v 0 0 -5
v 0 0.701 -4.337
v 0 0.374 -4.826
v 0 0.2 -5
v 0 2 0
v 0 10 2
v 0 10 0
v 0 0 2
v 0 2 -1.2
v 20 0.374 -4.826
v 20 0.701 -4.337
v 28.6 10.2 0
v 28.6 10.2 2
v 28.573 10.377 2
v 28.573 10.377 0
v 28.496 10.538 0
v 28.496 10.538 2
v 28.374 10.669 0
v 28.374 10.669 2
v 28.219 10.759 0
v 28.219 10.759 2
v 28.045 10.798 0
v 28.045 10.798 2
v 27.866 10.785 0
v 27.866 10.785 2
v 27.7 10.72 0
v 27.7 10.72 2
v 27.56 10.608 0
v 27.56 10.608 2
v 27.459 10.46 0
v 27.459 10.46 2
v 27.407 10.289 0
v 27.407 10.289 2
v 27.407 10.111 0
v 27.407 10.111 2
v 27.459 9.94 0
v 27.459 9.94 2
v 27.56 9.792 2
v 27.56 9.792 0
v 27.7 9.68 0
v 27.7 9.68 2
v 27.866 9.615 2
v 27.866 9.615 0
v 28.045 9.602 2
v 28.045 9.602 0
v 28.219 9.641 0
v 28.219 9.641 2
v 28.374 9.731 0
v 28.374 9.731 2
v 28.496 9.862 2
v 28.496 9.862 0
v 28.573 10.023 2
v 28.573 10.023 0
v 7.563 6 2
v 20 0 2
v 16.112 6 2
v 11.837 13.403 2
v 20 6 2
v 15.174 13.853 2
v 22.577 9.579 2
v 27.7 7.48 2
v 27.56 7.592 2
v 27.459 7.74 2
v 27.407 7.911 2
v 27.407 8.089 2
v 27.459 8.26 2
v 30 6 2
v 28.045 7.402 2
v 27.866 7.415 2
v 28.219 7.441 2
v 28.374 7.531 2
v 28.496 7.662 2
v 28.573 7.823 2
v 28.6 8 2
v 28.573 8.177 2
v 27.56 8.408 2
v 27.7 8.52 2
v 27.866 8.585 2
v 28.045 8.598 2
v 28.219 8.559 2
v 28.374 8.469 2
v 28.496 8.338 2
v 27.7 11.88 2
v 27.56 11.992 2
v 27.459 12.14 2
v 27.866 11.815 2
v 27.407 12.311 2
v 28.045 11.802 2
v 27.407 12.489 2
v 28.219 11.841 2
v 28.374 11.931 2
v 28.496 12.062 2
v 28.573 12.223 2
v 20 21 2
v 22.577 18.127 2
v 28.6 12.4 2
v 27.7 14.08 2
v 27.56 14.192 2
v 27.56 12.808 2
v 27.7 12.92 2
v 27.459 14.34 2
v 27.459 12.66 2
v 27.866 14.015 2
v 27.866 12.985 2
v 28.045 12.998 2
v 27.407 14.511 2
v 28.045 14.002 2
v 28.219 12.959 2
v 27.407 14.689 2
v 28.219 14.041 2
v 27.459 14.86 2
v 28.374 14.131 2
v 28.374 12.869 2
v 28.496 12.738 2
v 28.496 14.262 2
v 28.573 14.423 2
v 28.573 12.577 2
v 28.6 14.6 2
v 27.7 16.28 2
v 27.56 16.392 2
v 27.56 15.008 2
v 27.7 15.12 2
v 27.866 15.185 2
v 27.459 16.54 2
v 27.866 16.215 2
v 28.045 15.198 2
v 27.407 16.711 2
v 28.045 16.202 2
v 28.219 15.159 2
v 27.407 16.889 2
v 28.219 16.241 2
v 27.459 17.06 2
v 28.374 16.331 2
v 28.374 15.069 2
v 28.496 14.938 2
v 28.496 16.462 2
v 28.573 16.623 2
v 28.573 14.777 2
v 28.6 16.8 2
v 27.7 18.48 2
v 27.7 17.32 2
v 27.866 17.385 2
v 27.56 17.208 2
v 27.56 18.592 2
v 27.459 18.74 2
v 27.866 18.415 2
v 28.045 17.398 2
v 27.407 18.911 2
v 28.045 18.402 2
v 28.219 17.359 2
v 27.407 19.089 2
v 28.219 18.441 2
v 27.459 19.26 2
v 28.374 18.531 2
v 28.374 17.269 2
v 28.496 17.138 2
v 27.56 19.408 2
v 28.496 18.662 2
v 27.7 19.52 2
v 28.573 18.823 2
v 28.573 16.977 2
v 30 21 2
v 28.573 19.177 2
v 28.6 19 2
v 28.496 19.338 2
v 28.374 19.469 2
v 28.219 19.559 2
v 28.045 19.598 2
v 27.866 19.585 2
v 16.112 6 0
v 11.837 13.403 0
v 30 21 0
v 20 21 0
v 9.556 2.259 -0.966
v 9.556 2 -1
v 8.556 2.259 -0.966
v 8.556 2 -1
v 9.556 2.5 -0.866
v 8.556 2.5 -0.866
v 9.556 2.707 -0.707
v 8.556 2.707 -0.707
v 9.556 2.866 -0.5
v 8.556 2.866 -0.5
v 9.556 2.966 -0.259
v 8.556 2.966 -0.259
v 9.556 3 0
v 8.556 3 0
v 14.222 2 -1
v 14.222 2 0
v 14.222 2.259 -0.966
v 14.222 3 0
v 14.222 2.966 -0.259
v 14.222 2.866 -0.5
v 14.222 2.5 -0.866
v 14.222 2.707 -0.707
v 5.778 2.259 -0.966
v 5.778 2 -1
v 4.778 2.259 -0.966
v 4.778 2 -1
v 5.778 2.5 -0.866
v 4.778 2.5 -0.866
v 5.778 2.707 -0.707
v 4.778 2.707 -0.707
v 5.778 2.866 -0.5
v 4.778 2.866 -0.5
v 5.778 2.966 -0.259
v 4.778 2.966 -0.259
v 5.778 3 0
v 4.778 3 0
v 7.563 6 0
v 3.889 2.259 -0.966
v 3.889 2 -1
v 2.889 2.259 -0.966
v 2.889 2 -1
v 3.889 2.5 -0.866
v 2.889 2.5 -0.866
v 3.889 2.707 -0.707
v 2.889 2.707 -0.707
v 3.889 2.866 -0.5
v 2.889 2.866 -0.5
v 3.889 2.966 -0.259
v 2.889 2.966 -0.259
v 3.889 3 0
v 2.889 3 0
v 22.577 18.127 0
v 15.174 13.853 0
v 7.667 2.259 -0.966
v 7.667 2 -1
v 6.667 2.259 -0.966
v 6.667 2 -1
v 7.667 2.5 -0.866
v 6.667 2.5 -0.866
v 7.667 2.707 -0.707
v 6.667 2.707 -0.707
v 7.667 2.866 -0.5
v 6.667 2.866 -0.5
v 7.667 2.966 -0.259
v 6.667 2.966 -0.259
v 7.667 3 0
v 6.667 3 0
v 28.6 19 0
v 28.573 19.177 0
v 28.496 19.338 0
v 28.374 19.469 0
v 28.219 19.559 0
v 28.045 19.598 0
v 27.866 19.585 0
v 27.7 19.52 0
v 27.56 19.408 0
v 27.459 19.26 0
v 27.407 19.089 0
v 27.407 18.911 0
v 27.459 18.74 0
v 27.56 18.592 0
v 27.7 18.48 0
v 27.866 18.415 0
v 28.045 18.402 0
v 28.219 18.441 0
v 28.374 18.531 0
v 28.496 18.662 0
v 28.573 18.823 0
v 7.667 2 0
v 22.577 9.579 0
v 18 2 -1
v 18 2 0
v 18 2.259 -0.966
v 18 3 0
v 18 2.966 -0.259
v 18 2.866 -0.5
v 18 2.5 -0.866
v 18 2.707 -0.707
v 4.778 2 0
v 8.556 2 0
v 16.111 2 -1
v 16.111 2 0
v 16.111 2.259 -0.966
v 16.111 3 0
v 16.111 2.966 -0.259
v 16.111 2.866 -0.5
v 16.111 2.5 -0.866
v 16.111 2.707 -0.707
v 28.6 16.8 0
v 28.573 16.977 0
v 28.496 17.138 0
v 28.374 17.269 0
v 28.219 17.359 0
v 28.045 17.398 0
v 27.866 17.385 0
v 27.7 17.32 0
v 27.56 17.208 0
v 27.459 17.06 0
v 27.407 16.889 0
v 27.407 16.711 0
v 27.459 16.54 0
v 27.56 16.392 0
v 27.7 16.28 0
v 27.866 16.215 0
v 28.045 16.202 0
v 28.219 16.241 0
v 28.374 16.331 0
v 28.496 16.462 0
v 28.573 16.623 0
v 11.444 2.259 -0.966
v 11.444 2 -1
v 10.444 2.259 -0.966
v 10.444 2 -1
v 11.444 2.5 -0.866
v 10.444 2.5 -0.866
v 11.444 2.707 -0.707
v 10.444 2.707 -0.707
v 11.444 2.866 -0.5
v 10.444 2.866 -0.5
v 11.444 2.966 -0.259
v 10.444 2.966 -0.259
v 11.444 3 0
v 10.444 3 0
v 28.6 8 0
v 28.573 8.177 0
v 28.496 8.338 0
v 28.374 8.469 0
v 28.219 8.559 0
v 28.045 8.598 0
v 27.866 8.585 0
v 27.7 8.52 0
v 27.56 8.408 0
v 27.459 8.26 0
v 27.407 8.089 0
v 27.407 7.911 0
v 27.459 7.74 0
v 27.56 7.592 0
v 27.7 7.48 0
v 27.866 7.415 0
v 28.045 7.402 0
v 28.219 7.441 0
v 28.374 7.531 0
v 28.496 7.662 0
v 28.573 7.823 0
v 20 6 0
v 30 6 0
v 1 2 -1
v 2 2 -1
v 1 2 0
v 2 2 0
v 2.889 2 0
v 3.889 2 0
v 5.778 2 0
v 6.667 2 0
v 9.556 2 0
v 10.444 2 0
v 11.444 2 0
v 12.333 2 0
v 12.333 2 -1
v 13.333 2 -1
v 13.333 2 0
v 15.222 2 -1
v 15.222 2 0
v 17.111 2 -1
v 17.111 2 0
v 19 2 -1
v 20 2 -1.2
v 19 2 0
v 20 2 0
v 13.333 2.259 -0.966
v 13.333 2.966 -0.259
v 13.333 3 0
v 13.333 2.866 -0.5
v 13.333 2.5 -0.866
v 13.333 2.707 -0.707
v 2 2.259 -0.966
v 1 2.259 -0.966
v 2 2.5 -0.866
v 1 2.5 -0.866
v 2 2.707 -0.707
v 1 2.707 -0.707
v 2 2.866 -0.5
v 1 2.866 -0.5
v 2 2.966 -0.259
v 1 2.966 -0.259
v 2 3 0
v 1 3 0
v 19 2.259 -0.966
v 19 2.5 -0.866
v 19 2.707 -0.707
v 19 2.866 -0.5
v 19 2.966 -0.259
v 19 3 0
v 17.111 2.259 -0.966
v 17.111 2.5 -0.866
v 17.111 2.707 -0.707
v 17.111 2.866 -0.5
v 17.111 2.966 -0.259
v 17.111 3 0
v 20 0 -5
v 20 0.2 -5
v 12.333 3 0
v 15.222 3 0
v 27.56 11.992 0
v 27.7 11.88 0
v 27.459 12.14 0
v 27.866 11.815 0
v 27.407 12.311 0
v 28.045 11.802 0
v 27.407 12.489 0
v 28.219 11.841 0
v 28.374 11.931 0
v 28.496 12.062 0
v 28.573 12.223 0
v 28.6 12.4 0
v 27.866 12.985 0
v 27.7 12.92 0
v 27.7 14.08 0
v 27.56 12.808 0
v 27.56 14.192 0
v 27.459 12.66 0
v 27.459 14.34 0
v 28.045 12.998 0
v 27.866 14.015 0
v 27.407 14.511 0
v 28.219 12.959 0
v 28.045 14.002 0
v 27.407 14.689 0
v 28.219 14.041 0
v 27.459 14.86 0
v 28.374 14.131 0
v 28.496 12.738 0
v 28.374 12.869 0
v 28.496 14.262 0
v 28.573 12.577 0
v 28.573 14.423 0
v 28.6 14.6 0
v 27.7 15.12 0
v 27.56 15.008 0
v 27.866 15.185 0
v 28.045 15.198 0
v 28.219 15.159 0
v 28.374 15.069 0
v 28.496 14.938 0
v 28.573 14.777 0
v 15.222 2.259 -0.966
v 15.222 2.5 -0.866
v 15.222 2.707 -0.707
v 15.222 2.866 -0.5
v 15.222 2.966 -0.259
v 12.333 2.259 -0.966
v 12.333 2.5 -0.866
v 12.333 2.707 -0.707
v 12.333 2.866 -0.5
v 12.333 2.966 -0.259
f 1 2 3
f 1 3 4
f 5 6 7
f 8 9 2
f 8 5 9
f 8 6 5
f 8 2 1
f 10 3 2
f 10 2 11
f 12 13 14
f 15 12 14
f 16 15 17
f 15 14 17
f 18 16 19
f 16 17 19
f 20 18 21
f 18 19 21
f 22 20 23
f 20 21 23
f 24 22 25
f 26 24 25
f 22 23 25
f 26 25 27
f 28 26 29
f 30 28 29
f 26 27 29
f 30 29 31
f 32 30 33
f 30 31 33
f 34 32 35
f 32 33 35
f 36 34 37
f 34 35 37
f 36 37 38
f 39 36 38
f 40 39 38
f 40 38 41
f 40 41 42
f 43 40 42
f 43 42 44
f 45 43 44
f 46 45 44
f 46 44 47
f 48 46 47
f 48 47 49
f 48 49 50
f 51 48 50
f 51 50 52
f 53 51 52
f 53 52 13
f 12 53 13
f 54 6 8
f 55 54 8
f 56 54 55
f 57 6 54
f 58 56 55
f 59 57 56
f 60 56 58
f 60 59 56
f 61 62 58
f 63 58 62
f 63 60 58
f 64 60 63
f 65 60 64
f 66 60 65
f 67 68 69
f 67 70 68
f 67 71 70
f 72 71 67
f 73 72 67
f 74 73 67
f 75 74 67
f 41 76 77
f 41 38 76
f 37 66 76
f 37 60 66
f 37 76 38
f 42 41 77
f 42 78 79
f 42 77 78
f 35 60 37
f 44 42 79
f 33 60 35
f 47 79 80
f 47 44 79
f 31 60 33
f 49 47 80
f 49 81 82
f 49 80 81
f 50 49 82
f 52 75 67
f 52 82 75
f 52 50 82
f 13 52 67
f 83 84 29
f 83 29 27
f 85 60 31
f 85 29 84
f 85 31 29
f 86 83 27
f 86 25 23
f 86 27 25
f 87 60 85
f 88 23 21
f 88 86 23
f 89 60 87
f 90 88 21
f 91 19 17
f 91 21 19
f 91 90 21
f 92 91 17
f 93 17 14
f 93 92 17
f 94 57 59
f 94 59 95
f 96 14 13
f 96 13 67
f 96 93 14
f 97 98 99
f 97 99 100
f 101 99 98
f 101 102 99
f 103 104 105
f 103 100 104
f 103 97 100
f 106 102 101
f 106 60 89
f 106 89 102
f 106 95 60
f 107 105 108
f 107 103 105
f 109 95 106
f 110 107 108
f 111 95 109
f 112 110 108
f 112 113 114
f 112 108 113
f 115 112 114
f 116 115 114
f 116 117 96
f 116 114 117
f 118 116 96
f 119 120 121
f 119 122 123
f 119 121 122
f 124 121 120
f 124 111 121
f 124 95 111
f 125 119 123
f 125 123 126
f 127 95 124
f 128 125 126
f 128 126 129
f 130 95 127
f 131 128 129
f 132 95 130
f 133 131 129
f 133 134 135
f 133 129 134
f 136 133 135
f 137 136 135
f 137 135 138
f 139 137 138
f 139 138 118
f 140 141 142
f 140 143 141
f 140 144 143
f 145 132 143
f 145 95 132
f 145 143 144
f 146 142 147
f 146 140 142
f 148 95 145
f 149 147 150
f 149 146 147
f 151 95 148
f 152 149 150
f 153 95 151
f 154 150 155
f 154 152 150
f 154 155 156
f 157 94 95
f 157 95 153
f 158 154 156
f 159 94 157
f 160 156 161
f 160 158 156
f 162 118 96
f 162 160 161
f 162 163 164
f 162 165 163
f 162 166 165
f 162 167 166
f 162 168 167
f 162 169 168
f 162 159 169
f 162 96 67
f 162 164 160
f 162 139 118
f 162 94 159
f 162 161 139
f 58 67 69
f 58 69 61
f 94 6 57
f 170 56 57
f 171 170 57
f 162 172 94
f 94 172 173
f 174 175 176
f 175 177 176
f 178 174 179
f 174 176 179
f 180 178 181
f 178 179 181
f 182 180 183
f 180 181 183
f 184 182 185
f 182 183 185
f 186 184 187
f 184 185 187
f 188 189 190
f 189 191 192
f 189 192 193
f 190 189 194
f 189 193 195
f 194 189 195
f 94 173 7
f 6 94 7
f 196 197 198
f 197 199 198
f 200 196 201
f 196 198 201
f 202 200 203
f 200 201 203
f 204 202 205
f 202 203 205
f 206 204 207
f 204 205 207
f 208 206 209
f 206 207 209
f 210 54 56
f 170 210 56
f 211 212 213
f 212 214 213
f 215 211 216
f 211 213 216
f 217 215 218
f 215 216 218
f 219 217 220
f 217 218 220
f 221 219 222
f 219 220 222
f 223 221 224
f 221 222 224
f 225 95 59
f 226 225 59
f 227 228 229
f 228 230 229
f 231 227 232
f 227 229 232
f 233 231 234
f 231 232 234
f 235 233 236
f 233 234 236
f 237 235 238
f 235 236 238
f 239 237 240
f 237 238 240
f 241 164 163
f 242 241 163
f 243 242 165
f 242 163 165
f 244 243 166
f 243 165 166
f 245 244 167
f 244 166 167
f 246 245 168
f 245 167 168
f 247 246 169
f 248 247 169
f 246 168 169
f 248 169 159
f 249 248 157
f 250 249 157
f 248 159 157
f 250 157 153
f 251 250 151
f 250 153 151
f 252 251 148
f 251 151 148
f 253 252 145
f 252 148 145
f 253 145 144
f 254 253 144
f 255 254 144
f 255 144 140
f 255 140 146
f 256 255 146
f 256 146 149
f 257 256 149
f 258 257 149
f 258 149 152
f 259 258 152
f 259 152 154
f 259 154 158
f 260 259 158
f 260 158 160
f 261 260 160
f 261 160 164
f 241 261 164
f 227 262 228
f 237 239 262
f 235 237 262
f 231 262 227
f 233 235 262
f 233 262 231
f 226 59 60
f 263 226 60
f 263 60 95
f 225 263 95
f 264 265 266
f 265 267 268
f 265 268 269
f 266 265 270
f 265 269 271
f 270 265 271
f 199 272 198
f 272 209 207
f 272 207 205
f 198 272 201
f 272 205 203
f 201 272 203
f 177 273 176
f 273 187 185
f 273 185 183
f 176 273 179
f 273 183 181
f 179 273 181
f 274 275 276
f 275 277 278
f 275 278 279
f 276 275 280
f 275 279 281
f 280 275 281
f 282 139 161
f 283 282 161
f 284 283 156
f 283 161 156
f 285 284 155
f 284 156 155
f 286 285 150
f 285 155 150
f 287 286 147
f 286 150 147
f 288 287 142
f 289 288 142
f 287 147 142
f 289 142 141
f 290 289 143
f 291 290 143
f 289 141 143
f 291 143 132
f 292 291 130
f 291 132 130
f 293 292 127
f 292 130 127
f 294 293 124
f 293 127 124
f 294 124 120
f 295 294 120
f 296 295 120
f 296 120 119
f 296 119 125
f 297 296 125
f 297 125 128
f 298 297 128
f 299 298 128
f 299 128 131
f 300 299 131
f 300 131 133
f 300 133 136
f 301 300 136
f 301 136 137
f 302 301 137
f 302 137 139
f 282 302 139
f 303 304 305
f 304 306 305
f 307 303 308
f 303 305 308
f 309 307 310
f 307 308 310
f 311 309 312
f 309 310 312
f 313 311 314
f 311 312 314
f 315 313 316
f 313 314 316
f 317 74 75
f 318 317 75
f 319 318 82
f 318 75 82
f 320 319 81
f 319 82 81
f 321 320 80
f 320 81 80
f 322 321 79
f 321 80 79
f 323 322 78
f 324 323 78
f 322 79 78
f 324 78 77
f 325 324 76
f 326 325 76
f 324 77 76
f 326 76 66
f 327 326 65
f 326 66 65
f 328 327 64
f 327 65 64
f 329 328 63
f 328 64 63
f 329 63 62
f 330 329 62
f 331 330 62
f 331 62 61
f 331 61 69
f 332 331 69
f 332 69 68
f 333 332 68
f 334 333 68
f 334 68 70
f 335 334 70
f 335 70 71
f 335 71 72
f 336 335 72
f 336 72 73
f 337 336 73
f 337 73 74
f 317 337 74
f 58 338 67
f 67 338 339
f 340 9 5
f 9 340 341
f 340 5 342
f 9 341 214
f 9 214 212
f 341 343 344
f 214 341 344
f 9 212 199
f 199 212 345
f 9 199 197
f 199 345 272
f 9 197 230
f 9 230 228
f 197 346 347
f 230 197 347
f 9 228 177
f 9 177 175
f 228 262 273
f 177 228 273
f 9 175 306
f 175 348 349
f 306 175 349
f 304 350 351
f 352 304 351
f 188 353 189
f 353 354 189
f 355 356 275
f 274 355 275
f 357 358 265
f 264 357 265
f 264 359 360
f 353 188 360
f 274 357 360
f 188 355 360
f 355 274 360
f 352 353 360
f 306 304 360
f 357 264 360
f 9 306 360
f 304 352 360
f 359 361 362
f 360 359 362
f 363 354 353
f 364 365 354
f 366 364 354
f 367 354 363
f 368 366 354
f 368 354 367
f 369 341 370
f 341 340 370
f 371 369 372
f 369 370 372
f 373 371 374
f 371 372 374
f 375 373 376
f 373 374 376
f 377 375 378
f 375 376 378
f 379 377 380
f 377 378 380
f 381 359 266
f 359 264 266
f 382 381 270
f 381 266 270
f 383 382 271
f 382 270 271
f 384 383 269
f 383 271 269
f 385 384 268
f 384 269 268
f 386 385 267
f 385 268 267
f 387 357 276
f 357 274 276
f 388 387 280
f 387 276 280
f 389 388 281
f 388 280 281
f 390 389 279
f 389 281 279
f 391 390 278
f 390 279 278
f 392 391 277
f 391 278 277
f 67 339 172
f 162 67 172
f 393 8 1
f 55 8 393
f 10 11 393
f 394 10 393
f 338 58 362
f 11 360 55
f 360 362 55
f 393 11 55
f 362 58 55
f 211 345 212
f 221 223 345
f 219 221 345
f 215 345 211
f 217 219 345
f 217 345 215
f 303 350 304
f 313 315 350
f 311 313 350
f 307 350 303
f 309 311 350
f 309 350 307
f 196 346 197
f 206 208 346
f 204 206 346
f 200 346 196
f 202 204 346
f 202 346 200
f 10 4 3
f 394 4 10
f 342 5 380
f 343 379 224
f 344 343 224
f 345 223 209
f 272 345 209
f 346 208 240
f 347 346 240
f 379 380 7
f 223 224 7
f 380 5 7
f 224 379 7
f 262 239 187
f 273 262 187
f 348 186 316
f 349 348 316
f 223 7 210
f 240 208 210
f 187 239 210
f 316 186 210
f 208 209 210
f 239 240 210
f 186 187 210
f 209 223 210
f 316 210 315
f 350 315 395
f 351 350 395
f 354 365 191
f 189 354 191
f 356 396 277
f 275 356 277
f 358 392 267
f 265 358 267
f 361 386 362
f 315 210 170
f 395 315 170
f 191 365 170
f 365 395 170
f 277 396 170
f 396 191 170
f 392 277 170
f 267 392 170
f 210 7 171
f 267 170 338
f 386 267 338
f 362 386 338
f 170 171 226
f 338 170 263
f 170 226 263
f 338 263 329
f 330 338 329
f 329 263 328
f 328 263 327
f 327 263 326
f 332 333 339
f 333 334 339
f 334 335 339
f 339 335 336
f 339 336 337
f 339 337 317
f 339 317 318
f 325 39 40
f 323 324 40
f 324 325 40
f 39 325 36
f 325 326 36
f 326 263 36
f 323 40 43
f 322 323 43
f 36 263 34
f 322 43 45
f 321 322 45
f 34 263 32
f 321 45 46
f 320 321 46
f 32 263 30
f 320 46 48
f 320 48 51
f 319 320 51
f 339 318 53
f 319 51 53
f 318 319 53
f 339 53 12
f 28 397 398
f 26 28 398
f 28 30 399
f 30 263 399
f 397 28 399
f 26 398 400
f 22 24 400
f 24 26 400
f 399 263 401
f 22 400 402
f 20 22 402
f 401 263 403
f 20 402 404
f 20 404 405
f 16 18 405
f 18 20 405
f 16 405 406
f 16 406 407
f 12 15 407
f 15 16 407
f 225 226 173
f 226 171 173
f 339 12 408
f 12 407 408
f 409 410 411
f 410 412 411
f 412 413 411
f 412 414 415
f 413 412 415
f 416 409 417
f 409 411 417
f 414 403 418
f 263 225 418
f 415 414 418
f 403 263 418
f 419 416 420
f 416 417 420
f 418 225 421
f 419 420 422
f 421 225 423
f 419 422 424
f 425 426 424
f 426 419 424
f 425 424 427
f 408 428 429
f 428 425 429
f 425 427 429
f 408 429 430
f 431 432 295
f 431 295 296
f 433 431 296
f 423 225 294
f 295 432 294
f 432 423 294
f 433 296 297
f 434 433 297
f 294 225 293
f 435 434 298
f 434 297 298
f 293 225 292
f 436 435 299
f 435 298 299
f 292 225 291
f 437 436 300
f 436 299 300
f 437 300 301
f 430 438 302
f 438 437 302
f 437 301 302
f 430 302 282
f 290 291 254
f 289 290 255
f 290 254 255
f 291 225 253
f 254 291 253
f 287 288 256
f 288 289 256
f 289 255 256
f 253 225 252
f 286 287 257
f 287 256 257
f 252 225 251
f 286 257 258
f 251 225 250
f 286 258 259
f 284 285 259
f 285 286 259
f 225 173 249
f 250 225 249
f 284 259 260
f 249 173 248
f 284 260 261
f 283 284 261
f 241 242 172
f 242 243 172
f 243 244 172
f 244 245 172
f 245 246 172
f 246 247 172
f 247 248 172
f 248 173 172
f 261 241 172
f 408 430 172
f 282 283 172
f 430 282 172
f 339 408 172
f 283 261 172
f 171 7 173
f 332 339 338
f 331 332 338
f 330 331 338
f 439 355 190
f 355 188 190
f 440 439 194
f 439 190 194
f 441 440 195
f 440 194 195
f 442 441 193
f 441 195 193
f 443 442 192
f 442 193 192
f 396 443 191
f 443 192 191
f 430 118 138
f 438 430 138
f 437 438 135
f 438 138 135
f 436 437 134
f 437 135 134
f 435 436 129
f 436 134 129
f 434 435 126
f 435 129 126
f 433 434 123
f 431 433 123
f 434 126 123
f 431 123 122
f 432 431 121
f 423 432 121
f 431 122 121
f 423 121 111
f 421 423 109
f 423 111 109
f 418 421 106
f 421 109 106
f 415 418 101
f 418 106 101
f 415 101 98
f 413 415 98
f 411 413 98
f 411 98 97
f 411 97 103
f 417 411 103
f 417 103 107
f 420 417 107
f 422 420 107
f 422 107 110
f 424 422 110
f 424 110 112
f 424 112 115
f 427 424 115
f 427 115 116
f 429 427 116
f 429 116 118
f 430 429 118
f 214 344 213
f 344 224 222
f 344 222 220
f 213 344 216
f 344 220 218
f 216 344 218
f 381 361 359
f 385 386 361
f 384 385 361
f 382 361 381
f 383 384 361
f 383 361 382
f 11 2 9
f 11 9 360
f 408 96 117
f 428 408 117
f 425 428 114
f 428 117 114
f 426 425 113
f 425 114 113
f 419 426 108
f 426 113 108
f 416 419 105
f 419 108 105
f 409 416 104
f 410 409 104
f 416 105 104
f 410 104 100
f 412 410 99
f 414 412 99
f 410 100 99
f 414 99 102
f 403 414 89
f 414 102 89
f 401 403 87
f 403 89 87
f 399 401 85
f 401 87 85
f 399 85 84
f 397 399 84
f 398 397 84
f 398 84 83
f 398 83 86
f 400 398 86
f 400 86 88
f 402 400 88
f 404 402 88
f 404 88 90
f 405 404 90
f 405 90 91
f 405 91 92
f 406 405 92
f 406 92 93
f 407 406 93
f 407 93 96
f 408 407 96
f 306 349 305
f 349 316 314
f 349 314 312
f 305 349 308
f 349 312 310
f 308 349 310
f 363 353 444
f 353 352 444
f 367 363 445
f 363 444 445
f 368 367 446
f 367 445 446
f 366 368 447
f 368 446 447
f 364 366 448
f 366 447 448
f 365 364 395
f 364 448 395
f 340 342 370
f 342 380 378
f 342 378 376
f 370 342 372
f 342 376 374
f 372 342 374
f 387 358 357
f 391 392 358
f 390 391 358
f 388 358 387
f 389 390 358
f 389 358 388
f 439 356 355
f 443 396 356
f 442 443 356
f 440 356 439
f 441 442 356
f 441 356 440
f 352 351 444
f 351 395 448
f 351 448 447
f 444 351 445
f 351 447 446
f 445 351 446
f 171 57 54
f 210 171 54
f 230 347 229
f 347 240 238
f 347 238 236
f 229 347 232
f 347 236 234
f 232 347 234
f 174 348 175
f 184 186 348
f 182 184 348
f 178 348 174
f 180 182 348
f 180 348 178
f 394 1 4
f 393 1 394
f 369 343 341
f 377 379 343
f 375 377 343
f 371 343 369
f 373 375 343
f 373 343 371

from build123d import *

# Parameters (mm, degrees)
PAD_DEPTH              = 2
SKETCH001_R            = 0.6
HOLE_DEPTH             = 2.001
LINEARPATTERN_COUNT    = 6
LINEARPATTERN_PITCH    = 2.2
POCKET_DEPTH           = 2.001
SKETCH003_W            = 20
SKETCH003_H            = 2
PAD001_DEPTH           = 5
SKETCH004_W            = 1
SKETCH004_H            = 1
REVOLUTION_ANGLE       = -90
LINEARPATTERN001_COUNT = 10
LINEARPATTERN001_PITCH = 1.888889
CHAMFER_SIZE           = 1.8
CHAMFER001_SIZE        = 2
CHAMFER002_SIZE        = 0.3


with BuildPart() as part:
    # Sketch → Pad (new body)
    with BuildSketch(Plane.XY):
        Polygon((0, 0), (20, 0), (20, 6), (30, 6), (30, 21), (20, 21), (0, 10), align=None)
    extrude(amount=PAD_DEPTH)

    # Sketch001 (on Face9 of Pad) → Hole (cut, through all)
    with BuildSketch(Plane.XY.offset(2)):
        with Locations((28, 19)):
            Circle(SKETCH001_R)
    hole = extrude(amount=-HOLE_DEPTH, mode=Mode.SUBTRACT)

    # LinearPattern: Hole ×6
    with Locations(*[(0, -i * LINEARPATTERN_PITCH, 0) for i in range(1, LINEARPATTERN_COUNT)]):
        add(hole, mode=Mode.SUBTRACT)

    # Sketch002 (on Face5 of LinearPattern) → Pocket (cut, through all)
    with BuildSketch(Plane.XY.offset(2)):
        Polygon((11.837454, 13.403028), (7.563314, 6), (16.111595, 6), align=None)
        Polygon((22.577143, 9.579128), (22.577143, 18.127408), (15.174115, 13.853268), align=None)
    extrude(amount=-POCKET_DEPTH, mode=Mode.SUBTRACT)

    # Sketch003 (on Face4 of Pocket) → Pad001 (join)
    with BuildSketch(Plane(origin=(0, 0, 0), x_dir=(1, 0, 0), z_dir=(0, 0, -1))):
        with Locations((10, -1)):
            Rectangle(SKETCH003_W, SKETCH003_H)
    extrude(amount=PAD001_DEPTH)

    # Sketch004 (on Face19 of Pad001) → Revolution (revolve)
    with BuildSketch(Plane(origin=(0, 2, 0), x_dir=(-1, 0, 0), z_dir=(0, 1, 0))):
        with Locations((-18.5, -0.5)):
            Rectangle(SKETCH004_W, SKETCH004_H)
    revolution = revolve(axis=Axis((10, 2, 0), (-1, 0, 0)), revolution_arc=REVOLUTION_ANGLE)

    # LinearPattern001: Revolution ×10
    with Locations(*[(-i * LINEARPATTERN001_PITCH, 0, 0) for i in range(1, LINEARPATTERN001_COUNT)]):
        add(revolution)

    # Chamfer
    chamfer_edges = [part.edges().sort_by_distance(p)[0] for p in [
        (10, 2, -5),
    ]]
    chamfer(chamfer_edges, length=CHAMFER_SIZE)

    # Chamfer001
    chamfer001_edges = [part.edges().sort_by_distance(p)[0] for p in [
        (10, 2, -3.2),
    ]]
    chamfer(chamfer001_edges, length=CHAMFER001_SIZE)

    # Chamfer002
    chamfer002_edges = [part.edges().sort_by_distance(p)[0] for p in [
        (10, 0.585786, -4.614214),
    ]]
    chamfer(chamfer002_edges, length=CHAMFER002_SIZE)


solid = part.part
